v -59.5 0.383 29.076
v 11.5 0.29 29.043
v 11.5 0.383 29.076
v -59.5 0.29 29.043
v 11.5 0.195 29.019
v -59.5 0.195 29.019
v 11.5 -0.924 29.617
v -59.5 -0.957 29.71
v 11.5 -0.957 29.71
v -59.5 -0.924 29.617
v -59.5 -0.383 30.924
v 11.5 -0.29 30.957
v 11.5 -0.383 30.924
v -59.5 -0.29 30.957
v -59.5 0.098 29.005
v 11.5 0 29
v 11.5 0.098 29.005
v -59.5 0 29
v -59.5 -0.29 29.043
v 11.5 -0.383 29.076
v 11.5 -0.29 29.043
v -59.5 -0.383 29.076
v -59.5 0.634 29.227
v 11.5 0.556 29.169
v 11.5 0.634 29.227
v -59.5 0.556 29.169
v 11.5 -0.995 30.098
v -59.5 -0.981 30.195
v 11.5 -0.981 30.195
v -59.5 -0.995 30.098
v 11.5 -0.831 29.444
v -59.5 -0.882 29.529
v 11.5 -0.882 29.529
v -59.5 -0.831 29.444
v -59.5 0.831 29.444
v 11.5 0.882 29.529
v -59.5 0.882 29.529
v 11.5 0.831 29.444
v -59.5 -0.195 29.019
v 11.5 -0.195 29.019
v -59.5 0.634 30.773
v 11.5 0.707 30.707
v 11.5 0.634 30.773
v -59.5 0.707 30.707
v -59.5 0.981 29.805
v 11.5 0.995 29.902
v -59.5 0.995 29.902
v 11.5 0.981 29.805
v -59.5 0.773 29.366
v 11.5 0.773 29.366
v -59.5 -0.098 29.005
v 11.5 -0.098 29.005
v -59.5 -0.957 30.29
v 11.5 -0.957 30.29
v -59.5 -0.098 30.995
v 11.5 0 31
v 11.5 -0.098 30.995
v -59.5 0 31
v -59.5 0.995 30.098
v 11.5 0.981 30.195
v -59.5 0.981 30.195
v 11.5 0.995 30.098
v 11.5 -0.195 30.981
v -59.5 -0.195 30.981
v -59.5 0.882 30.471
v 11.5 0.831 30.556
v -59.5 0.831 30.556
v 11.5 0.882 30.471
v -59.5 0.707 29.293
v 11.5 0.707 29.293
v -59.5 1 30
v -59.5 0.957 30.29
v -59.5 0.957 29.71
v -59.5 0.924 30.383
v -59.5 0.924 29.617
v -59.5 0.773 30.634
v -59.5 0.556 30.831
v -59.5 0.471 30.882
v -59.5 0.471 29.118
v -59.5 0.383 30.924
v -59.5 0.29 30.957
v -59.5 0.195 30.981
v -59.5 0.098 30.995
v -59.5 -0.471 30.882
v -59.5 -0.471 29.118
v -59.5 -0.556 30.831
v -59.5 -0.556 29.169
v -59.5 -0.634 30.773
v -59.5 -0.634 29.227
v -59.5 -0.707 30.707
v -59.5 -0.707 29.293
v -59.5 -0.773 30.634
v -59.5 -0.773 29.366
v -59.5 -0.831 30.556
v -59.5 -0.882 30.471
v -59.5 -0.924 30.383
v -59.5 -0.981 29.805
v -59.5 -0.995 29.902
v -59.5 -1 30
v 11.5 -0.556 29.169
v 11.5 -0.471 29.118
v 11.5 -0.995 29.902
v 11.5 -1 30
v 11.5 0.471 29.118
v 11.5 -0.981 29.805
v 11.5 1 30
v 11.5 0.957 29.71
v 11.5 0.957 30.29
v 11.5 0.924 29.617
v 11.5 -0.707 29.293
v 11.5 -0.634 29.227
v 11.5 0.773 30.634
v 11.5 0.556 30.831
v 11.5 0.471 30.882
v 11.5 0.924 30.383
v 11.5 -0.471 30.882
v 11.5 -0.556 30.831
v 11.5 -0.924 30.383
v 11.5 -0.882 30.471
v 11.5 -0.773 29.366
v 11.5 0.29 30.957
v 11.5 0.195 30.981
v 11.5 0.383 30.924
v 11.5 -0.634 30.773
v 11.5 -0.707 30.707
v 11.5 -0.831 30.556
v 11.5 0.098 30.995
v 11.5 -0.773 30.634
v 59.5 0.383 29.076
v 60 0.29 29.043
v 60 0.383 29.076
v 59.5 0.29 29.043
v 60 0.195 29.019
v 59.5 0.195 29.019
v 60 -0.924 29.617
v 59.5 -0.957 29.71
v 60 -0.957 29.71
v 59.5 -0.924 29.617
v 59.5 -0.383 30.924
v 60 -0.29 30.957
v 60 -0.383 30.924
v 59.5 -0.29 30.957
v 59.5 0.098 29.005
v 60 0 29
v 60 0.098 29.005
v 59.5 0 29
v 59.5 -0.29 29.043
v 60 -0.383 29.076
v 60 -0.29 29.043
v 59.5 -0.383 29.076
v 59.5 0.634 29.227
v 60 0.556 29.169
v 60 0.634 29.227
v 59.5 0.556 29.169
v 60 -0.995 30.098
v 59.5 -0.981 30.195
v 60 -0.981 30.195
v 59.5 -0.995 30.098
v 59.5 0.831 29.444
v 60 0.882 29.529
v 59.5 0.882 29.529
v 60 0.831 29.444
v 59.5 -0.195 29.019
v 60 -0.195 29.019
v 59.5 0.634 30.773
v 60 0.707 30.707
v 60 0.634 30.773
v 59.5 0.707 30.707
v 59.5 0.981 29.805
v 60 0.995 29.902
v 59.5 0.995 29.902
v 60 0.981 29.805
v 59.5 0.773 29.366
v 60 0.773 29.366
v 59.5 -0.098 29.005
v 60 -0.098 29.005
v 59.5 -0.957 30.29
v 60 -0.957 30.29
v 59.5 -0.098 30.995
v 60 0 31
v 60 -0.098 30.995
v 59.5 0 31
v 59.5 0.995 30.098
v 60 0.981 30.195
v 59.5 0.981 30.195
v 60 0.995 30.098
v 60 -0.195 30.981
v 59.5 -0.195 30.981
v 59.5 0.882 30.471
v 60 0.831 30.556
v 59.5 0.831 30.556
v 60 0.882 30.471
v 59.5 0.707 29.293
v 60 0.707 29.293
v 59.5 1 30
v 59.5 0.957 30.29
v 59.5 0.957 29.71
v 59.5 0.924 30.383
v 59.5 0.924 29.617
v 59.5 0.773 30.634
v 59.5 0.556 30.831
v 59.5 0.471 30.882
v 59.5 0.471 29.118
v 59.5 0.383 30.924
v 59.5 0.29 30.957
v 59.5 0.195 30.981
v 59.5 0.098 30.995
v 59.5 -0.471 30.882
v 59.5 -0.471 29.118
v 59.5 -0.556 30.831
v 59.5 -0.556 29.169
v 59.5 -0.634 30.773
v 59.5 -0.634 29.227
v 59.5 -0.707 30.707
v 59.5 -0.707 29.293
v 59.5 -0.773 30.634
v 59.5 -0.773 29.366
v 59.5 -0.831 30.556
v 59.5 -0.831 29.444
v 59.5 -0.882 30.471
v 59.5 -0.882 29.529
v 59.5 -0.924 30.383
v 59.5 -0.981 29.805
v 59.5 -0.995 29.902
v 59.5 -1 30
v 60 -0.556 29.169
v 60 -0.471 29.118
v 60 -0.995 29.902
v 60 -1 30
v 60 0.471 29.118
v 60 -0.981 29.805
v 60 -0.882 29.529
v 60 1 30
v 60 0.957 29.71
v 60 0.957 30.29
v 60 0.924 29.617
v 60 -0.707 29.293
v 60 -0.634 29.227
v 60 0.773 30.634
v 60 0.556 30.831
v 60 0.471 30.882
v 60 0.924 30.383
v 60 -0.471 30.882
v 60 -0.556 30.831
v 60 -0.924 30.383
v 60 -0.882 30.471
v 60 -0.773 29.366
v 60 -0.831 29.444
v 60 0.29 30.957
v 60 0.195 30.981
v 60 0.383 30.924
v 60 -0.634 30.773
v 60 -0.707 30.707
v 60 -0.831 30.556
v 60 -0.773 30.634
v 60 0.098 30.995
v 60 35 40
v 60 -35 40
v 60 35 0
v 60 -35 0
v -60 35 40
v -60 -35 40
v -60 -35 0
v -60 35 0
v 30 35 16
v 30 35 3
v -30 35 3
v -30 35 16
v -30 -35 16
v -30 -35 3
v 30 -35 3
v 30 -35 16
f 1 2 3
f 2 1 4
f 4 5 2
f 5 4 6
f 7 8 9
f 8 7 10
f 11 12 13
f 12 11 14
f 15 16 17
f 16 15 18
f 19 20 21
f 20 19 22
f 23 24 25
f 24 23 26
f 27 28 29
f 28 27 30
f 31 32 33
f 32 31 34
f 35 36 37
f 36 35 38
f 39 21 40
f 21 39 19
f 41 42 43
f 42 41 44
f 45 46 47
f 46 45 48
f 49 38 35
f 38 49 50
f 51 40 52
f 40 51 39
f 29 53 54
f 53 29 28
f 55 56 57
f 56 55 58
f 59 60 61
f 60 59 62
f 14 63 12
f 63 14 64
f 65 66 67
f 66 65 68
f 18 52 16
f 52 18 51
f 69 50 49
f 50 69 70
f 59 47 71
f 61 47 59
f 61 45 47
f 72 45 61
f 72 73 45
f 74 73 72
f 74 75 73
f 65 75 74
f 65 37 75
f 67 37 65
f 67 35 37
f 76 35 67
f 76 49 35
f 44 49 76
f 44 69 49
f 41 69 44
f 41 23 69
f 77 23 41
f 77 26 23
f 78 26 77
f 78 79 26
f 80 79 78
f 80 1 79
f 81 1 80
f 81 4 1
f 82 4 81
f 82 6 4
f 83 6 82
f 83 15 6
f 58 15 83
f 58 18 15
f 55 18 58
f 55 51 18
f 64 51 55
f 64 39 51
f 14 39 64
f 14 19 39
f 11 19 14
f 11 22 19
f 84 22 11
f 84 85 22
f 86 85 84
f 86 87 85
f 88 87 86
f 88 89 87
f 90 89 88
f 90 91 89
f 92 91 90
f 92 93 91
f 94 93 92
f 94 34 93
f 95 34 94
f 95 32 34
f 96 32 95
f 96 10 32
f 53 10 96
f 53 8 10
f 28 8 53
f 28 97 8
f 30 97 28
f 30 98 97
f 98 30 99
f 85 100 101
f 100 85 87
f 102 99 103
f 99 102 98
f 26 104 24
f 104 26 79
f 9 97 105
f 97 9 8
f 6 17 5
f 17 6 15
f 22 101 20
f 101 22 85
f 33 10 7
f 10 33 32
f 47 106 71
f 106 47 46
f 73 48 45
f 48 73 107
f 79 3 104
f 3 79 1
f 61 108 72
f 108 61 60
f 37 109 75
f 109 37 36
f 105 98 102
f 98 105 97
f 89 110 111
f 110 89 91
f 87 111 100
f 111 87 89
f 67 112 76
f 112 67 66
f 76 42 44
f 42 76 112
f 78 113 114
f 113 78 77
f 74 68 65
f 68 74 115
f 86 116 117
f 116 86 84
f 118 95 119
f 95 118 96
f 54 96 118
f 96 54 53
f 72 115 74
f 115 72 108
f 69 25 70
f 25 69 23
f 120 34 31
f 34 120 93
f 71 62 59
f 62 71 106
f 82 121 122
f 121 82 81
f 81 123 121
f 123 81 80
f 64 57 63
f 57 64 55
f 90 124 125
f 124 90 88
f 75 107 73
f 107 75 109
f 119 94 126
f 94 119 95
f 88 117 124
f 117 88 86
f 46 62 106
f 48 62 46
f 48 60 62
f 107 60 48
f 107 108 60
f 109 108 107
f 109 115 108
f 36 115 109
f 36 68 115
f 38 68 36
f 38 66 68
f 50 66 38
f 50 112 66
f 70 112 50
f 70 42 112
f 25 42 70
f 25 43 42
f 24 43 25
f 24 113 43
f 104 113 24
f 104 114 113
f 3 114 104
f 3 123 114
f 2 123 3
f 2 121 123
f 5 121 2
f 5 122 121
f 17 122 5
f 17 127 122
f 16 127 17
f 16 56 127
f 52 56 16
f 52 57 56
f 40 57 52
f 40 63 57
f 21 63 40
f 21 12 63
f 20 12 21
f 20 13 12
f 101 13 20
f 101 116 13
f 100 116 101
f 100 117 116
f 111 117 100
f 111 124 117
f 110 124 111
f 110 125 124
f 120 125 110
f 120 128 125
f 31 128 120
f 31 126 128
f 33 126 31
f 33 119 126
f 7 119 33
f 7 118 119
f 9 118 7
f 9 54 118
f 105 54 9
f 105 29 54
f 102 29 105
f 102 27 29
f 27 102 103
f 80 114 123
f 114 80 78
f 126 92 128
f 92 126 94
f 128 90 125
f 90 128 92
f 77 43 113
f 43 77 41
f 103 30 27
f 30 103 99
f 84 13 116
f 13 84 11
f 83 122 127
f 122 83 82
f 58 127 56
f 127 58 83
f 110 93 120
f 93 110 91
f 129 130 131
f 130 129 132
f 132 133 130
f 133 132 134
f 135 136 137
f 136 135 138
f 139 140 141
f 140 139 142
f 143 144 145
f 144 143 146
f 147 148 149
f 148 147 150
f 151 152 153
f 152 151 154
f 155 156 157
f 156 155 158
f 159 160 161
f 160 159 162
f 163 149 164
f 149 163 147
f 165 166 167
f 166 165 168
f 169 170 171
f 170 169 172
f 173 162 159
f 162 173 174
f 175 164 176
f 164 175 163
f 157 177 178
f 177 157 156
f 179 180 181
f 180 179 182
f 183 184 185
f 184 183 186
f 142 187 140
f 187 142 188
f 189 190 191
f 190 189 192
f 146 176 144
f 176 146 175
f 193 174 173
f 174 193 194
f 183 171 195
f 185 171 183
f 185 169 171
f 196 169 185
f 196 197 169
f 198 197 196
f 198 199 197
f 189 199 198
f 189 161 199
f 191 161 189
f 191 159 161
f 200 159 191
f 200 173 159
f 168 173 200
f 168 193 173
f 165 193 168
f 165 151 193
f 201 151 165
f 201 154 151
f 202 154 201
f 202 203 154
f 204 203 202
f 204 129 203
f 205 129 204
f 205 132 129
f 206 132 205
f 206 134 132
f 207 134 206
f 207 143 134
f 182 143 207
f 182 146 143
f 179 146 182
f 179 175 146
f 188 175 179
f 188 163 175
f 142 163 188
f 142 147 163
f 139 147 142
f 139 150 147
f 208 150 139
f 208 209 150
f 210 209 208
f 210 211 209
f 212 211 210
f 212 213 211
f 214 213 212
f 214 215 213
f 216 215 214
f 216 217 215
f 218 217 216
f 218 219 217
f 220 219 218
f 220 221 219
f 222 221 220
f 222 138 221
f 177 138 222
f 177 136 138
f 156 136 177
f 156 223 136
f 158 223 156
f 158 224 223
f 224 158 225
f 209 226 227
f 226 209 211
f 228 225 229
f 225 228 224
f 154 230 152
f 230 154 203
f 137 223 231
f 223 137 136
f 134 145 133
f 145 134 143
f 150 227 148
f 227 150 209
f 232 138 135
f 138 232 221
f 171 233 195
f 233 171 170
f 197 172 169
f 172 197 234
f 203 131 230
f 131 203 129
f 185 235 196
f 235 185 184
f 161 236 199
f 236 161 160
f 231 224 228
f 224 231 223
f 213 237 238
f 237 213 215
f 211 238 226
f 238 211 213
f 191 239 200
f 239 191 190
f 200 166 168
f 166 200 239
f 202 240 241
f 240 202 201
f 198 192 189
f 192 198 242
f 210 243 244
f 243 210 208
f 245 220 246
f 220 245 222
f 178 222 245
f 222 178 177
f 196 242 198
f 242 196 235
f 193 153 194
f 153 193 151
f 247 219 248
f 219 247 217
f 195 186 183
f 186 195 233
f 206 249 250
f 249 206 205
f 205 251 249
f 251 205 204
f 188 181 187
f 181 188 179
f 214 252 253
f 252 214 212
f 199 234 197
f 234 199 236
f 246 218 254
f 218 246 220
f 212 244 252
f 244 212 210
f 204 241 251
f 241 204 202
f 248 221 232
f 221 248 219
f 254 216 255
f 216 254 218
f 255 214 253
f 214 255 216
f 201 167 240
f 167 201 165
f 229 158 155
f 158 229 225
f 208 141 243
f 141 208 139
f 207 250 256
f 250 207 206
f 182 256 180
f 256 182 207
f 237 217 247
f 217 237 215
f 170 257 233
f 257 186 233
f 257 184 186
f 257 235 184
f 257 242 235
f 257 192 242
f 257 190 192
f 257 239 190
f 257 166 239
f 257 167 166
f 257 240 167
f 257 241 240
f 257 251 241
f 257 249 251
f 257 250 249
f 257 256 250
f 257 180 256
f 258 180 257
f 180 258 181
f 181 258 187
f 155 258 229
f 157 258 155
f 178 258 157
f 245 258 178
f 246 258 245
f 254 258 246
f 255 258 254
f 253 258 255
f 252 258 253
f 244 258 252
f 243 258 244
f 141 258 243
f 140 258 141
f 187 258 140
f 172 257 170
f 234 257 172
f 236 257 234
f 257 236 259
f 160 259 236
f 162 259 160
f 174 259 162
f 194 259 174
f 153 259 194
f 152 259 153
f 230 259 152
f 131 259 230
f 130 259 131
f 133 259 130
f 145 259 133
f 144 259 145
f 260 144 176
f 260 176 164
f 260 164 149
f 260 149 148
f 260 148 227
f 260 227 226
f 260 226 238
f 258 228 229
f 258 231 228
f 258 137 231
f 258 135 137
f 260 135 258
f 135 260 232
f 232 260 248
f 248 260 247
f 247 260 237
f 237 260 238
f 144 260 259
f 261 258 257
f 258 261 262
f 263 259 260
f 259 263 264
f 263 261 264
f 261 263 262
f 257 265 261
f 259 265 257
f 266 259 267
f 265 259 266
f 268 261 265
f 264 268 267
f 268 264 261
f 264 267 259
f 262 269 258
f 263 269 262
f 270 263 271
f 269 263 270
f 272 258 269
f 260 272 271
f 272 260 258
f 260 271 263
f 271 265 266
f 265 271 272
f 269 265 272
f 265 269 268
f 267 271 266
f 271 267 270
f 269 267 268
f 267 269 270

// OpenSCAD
// Mini horizontal gel-electrophoresis buffer tank
// Print orientation: tank rests on XY plane, builds upward in +Z

$fn = 64;

// ---- Tank dimensions ----
tank_x_out = 120;   // outer length in X
tank_y_out = 70;    // outer width in Y
tank_z_out = 40;    // outer height in Z
wall       = 3;     // wall thickness
floor      = 3;     // floor thickness

// ---- Platform dimensions ----
plat_x     = 60;    // platform length in X (centred)
plat_y     = tank_y_out; // platform spans full inner width
plat_top_z = 13;    // platform top height above tank floor

// ---- Cutout dimensions ----
hole_d     = 2;     // electrode wire hole diameter
hole_y     = 0;     // hole centre Y
hole_z     = 30;    // hole centre Z

// ---- Derived ----
inner_h = tank_z_out - floor; // height of buffer chambers
eps     = 0.5;              // cutter overshoot

difference() {
    // Tank body (solid outer block, open top)
    translate([-tank_x_out/2, -tank_y_out/2, 0])
        cube([tank_x_out, tank_y_out, tank_z_out]);

    // Gel tray platform, raised from floor
    translate([-plat_x/2, -plat_y/2, floor])
        cube([plat_x, plat_y, plat_top_z]);

    // Electrode wire holes through end walls
    for (sx = [-1, 1])
        translate([sx * (tank_x_out/2 - eps), hole_y, hole_z])
            rotate([0, 90, 0])
                cylinder(d = hole_d, h = tank_y_out + 2*eps);
}
